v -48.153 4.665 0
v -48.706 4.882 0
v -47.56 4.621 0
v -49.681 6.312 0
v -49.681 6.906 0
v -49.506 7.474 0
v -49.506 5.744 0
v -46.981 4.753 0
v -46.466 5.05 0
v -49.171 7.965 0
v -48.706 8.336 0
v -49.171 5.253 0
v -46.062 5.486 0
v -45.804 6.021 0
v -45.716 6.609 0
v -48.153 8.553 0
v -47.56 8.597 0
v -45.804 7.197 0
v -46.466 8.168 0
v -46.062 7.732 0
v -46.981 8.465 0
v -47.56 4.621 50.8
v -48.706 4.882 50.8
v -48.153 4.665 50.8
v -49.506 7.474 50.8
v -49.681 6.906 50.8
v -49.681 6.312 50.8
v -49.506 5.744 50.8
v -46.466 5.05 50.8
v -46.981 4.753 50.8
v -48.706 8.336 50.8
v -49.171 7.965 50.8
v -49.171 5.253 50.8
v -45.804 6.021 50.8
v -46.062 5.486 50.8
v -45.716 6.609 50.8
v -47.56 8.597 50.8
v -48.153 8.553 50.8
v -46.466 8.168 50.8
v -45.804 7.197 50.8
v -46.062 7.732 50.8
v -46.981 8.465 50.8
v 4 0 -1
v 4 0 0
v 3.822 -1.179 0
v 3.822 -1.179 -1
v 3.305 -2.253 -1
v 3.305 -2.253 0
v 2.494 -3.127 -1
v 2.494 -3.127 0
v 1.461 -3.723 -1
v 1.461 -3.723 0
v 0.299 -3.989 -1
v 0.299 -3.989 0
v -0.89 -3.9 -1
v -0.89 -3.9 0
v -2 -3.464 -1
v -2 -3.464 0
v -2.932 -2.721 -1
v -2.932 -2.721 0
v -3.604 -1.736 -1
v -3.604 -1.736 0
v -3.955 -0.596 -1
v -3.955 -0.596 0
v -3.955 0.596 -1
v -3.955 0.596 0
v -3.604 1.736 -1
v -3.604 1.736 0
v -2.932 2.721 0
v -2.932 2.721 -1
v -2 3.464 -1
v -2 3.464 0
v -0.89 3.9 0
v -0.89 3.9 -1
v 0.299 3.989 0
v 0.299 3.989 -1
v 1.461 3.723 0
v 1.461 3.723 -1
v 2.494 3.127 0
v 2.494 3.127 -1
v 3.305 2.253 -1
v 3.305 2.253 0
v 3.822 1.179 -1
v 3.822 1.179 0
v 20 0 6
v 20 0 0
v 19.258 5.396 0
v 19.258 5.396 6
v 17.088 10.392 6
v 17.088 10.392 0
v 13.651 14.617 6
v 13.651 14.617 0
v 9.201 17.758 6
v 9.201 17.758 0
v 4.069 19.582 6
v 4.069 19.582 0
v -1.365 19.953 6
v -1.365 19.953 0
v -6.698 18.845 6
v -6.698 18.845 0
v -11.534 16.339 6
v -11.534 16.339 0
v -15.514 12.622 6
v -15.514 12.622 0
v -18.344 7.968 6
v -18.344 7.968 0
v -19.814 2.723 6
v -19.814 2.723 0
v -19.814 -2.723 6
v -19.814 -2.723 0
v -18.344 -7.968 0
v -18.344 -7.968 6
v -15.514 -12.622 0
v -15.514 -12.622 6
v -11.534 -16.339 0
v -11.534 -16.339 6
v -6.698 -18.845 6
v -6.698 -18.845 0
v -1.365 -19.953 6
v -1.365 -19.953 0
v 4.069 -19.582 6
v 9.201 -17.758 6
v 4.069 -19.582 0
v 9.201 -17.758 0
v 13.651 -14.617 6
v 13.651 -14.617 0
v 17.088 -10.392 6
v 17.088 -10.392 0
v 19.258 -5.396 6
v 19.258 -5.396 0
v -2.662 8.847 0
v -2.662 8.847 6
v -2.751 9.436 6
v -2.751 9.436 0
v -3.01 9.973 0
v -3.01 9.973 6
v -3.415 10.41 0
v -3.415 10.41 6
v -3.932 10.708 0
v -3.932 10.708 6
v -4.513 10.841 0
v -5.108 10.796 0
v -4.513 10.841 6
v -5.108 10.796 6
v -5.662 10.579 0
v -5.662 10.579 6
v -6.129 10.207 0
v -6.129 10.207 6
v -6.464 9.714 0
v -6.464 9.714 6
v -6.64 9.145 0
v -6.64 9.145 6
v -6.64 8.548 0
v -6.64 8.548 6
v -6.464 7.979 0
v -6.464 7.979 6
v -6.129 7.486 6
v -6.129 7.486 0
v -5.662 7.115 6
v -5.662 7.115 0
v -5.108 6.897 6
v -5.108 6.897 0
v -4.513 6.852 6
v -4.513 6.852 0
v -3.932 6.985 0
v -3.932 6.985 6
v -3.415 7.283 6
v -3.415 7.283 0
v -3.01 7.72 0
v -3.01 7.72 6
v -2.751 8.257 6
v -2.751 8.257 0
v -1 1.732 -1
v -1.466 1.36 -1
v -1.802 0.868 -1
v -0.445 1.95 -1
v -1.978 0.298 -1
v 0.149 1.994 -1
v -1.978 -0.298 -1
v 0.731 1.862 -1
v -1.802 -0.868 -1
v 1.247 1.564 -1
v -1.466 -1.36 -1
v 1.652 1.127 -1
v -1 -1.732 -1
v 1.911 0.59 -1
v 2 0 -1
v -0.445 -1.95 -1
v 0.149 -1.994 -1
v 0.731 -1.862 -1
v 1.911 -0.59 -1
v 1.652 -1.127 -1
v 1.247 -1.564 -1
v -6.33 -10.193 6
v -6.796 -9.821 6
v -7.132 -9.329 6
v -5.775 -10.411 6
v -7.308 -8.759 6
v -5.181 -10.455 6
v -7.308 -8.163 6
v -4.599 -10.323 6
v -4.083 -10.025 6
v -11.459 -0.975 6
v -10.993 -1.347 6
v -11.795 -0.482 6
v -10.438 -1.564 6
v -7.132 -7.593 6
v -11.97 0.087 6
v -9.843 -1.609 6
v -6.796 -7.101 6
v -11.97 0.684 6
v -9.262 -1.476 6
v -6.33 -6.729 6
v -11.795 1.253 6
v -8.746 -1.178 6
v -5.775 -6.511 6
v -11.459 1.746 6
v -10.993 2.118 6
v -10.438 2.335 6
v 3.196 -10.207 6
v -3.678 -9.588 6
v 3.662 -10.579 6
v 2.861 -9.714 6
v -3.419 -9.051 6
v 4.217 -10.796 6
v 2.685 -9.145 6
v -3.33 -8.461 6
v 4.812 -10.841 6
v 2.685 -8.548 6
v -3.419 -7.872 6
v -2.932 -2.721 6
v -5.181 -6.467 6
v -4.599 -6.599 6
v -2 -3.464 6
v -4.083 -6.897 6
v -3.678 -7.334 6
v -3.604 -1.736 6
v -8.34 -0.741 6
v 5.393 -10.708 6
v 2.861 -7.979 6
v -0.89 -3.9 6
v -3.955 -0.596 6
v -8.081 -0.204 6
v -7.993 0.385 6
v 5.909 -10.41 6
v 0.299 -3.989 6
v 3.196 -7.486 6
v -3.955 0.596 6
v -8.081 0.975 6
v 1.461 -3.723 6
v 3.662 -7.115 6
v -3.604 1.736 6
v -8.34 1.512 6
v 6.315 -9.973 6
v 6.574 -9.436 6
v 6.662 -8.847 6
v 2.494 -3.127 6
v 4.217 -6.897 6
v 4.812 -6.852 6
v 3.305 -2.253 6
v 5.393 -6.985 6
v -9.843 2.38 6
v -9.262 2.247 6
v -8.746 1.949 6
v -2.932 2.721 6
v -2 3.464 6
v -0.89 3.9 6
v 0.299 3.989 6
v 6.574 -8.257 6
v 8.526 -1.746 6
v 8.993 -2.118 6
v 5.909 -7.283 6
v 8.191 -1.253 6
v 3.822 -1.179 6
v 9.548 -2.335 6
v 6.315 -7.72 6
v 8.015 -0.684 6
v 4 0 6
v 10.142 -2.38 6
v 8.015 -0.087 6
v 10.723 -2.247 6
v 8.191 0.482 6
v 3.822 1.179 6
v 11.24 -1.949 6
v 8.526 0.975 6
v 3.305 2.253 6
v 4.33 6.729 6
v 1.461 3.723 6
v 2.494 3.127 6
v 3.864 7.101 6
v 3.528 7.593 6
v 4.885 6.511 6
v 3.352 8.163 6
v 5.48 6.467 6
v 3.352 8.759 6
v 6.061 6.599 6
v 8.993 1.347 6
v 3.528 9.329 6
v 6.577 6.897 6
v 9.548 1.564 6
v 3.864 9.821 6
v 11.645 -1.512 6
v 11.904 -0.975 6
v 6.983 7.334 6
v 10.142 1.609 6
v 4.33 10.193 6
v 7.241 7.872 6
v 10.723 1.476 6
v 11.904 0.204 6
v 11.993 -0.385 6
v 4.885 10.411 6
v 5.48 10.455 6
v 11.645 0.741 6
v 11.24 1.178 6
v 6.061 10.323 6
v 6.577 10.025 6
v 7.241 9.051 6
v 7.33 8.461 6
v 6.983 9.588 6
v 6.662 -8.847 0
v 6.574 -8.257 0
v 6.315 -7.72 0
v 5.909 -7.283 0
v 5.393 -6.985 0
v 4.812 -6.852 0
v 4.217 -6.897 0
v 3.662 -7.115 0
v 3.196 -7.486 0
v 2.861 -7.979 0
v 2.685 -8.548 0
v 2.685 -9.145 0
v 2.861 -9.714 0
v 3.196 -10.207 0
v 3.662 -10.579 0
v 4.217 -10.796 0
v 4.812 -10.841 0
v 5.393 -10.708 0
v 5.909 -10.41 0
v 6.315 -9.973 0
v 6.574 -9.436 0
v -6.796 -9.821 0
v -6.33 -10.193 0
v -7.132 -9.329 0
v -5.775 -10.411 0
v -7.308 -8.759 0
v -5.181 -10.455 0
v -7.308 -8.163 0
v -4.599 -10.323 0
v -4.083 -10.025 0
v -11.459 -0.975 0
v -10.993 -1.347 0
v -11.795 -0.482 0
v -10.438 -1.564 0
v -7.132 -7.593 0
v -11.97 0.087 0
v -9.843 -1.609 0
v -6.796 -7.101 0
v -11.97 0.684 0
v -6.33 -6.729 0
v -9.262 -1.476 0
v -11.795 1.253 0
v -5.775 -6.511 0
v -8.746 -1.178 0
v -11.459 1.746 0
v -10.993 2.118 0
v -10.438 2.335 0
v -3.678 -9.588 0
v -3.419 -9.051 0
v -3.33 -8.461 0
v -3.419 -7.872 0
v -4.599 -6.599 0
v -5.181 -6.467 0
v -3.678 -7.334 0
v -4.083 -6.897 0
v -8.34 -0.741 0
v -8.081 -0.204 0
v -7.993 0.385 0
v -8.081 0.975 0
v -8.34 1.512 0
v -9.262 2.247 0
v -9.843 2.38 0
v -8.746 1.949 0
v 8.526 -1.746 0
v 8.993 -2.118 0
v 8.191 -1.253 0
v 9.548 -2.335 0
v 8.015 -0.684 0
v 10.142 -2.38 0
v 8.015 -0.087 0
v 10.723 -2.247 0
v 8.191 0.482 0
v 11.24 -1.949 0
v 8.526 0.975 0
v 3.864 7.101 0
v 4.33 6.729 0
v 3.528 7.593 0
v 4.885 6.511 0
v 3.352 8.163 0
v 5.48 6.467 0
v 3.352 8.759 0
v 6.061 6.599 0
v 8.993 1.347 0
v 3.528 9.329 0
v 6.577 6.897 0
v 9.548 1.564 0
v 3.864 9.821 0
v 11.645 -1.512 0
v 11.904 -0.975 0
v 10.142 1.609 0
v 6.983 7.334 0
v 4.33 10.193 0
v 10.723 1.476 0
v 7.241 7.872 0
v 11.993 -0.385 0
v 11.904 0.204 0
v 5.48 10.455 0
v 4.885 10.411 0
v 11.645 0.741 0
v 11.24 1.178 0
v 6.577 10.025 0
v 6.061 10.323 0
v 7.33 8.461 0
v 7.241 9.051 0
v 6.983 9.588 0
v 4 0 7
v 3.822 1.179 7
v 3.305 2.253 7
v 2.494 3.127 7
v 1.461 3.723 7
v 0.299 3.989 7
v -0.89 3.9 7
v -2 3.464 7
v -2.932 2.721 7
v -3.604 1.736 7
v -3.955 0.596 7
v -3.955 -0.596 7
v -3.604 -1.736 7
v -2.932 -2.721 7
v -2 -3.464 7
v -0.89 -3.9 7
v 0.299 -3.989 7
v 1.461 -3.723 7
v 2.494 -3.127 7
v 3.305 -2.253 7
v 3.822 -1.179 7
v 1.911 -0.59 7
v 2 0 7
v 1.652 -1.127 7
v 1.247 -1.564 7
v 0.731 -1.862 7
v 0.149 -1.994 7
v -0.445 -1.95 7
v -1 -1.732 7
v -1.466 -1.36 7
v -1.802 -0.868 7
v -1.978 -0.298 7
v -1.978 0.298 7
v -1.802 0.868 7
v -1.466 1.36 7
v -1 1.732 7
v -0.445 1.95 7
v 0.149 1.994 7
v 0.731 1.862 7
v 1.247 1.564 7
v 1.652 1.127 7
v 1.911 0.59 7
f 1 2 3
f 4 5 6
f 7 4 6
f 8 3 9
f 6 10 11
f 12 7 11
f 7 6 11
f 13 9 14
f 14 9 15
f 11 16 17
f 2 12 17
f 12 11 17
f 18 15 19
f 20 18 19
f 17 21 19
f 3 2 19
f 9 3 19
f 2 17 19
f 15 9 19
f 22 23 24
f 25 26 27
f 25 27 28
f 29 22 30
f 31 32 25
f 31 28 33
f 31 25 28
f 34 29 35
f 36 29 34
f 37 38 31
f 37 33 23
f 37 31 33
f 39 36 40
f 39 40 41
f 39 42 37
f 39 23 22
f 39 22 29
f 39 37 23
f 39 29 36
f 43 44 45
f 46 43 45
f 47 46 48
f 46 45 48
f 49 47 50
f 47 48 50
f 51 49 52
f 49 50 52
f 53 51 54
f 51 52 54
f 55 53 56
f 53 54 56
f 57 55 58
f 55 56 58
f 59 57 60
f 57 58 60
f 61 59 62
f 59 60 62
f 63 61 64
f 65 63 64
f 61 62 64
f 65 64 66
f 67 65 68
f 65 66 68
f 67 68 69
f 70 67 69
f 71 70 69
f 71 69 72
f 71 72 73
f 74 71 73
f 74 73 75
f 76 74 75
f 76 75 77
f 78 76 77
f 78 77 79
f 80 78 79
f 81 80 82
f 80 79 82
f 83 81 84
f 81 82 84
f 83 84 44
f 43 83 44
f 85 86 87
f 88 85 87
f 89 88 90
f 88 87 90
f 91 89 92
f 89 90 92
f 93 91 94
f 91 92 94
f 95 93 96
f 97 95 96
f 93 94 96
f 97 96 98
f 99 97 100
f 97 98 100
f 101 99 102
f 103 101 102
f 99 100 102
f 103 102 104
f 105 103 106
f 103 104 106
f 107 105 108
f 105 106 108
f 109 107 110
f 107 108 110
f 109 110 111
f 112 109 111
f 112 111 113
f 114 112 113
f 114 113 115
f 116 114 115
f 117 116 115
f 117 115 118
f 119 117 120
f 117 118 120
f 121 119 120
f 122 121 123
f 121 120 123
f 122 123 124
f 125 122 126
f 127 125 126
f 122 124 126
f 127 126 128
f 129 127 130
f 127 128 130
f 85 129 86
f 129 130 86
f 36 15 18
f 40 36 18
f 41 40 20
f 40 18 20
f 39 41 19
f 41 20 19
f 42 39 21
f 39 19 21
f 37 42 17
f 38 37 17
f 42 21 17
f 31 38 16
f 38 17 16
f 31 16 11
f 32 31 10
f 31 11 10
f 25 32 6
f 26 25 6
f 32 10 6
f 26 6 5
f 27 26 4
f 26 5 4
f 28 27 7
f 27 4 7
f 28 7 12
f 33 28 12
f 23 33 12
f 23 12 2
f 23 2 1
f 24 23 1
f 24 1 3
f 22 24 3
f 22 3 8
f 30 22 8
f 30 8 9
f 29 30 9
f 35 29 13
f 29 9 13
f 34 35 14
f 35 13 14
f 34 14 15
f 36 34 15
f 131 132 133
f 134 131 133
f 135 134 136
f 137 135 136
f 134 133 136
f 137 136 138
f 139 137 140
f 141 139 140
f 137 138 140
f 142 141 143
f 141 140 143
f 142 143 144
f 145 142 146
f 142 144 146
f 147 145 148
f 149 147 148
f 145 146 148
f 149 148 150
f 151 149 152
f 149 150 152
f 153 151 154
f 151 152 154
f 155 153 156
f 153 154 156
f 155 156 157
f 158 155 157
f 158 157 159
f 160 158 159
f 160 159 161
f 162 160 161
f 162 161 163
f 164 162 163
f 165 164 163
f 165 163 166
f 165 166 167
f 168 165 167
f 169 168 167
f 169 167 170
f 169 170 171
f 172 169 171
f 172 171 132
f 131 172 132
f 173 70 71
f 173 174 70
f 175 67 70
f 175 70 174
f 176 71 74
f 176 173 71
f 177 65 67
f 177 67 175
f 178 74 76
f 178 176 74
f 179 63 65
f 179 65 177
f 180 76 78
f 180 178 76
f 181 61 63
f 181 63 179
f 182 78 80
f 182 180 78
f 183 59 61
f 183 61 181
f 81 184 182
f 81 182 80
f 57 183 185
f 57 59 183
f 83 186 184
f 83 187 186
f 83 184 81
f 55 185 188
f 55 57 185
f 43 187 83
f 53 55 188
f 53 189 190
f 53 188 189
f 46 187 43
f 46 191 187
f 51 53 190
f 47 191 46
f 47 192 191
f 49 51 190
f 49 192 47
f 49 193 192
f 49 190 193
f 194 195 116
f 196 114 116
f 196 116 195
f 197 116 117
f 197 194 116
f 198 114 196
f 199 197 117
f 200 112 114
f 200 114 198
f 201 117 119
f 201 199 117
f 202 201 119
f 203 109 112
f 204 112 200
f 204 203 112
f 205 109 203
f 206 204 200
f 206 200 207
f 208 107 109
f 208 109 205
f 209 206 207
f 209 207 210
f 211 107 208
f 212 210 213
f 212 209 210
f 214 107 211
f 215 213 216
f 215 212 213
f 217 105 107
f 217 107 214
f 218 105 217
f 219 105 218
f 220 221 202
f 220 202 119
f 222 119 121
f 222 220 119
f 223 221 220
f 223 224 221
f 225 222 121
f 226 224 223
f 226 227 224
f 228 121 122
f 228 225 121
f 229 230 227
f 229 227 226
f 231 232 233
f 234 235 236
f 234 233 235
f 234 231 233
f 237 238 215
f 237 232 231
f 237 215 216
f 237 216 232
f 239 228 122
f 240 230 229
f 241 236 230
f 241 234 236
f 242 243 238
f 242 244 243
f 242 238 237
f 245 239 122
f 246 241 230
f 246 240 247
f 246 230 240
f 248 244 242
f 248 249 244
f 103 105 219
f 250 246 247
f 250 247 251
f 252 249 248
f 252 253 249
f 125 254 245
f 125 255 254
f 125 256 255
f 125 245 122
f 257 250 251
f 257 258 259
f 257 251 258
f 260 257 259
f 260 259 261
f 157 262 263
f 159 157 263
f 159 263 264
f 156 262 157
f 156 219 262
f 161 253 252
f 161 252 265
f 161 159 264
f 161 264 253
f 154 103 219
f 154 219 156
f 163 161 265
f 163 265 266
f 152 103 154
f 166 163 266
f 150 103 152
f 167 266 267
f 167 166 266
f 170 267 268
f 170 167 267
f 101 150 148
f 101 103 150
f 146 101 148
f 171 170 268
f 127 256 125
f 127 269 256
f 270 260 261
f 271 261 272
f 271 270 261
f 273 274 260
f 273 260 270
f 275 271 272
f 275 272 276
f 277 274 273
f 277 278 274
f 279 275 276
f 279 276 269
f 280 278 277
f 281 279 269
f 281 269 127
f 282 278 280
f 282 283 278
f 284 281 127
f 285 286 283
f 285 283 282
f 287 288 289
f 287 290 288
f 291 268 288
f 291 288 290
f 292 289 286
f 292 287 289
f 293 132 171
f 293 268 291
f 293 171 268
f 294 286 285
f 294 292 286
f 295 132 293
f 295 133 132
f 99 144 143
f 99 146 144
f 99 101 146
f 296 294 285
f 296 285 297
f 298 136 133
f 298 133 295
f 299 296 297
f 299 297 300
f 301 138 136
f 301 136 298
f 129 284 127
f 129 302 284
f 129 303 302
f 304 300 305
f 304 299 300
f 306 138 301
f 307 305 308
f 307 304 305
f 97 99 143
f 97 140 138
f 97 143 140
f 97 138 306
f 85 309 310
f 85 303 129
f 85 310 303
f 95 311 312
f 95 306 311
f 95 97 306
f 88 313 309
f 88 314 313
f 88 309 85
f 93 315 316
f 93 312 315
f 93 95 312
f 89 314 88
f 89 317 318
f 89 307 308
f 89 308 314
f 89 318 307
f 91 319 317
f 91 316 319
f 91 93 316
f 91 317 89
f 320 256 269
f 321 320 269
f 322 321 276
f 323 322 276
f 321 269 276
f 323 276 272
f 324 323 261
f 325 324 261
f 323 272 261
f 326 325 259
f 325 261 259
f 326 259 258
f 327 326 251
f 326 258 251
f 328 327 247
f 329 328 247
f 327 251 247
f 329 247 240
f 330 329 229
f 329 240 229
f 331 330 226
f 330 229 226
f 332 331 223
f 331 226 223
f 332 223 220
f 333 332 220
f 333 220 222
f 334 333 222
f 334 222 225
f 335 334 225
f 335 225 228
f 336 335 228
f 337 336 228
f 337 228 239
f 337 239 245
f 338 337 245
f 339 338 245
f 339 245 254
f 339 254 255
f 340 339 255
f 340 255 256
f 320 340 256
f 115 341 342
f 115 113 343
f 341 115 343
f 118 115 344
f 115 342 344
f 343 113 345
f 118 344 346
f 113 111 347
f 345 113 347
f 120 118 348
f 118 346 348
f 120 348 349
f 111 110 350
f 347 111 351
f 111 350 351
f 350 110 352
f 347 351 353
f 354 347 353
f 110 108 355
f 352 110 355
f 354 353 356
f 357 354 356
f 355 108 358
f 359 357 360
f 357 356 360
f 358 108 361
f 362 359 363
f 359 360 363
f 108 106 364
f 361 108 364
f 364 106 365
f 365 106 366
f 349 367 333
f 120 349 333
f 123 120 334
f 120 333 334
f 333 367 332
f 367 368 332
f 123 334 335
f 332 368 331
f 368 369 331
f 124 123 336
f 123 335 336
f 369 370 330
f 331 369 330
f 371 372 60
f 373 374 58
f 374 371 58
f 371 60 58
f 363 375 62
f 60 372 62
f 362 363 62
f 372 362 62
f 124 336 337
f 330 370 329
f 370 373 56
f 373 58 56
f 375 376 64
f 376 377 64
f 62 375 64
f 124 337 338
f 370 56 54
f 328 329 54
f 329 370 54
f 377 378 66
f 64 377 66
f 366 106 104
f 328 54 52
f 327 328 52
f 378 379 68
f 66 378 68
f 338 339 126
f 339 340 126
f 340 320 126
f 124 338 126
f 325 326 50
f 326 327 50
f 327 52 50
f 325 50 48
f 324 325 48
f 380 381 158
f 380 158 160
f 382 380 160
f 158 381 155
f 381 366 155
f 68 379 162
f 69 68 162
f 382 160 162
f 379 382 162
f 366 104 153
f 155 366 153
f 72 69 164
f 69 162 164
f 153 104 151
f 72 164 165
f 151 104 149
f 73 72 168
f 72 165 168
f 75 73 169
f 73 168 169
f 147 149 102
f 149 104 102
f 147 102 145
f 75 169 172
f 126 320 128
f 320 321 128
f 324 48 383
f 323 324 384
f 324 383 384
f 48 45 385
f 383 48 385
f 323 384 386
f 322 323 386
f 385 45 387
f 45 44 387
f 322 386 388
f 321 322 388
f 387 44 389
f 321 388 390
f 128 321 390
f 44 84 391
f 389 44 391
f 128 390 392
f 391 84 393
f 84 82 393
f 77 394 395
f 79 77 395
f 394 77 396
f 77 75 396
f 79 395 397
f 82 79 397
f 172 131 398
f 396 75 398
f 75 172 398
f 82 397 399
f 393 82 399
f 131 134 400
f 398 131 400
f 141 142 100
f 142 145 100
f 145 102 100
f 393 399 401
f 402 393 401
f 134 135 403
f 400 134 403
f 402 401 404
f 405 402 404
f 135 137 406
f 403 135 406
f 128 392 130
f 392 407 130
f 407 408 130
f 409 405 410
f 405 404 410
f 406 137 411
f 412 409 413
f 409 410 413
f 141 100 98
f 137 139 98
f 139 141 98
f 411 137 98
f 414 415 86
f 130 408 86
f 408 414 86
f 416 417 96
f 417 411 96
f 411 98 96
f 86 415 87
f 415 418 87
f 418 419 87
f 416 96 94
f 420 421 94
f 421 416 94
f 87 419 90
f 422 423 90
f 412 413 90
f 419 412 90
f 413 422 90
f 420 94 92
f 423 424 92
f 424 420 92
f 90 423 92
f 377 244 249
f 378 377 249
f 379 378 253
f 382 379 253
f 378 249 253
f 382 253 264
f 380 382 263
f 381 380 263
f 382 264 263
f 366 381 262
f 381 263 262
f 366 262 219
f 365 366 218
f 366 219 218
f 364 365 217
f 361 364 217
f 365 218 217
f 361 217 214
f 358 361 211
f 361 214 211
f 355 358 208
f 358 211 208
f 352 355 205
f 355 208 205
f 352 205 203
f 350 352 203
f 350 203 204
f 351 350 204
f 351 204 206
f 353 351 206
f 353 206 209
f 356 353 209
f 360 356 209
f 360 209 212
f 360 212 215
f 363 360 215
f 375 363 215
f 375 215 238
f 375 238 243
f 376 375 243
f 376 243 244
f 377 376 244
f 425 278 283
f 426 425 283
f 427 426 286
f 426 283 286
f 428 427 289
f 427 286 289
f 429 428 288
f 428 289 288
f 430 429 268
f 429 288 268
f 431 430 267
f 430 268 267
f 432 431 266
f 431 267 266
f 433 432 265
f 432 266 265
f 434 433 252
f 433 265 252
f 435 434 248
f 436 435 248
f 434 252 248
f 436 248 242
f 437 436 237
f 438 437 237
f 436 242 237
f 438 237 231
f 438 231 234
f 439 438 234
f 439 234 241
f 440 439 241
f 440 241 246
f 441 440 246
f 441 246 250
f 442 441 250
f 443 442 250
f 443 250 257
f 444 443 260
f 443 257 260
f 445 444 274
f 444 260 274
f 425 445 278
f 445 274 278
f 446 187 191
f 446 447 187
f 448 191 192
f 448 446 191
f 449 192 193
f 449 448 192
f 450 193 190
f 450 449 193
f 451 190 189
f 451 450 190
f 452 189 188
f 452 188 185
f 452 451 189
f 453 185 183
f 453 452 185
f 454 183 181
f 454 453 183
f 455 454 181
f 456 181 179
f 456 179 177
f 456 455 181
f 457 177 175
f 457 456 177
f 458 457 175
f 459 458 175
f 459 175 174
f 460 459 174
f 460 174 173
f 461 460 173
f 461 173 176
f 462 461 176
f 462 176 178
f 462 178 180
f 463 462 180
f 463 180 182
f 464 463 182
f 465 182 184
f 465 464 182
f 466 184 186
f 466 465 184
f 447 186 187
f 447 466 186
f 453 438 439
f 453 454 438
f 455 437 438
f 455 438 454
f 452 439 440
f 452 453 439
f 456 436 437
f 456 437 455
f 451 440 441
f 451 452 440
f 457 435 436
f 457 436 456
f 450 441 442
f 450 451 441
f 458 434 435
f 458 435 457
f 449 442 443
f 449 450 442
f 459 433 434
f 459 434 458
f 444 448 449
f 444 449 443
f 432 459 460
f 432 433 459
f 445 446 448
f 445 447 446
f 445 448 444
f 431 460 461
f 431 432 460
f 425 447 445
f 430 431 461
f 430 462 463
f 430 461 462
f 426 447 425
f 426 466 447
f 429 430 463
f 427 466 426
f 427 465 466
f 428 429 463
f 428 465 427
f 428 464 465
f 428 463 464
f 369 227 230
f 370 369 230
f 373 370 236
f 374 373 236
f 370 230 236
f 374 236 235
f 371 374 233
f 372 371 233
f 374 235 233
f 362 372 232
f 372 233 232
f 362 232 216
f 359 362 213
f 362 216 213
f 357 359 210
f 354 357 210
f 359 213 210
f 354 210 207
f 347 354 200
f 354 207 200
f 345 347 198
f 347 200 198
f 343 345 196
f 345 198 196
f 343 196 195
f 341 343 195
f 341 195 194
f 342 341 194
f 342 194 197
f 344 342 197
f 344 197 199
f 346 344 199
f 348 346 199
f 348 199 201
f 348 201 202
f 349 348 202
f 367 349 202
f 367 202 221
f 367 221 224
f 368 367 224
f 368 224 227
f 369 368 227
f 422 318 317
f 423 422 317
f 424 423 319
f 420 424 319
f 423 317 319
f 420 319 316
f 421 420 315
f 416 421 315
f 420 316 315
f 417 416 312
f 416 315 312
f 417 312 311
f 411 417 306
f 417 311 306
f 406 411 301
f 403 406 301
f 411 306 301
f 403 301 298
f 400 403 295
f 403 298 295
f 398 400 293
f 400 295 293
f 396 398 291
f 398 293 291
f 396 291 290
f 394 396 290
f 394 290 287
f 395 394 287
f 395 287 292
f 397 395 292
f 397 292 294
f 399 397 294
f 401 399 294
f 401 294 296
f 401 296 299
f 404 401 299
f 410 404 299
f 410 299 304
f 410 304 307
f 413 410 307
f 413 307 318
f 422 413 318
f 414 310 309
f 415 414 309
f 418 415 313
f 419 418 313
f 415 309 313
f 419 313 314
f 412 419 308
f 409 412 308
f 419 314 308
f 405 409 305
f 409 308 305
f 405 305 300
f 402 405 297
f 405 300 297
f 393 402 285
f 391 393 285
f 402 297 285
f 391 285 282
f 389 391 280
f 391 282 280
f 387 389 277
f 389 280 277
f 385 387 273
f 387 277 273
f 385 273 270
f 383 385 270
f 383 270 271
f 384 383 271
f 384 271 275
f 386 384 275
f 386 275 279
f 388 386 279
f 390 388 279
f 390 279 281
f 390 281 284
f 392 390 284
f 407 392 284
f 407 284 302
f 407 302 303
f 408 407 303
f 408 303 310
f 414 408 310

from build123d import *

# Parameters (mm, degrees)
F0_R     = 20
F1_DEPTH = 6
F2_R     = 2
F3_DEPTH = 6.001
F2_R_2   = 4
F4_DEPTH = 1
F5_R     = 4
F5_R_2   = 2
F6_DEPTH = 1
F7_R     = 1.9939
F8_DEPTH = 50.8


with BuildPart() as f1:
    # F0 (on Top) → F1 (new body)
    with BuildSketch(Plane.XY):
        Circle(F0_R)
    extrude(amount=F1_DEPTH)

    # F2 (on face) → F3 (cut, through all)
    with BuildSketch(Plane.XY.offset(6)):
        with Locations((-4.6624582915, 8.8465520221)):
            Circle(F2_R)
        with Locations((5.3301096413, 8.4610833356)):
            Circle(F2_R)
        with Locations((9.9925679328, -0.3854686866)):
            Circle(F2_R)
        with Locations((4.6624582915, -8.8465520221)):
            Circle(F2_R)
        with Locations((-5.3301096413, -8.4610833356)):
            Circle(F2_R)
        with Locations((-9.9925679328, 0.3854686866)):
            Circle(F2_R)
        Circle(F2_R)
    extrude(amount=-F3_DEPTH, mode=Mode.SUBTRACT)

    # F2 (on face) → F4 (join)
    with BuildSketch(Plane.XY.offset(6)):
        Circle(F2_R_2)
        Circle(F2_R, mode=Mode.SUBTRACT)
    extrude(amount=F4_DEPTH)

    # F5 (on face) → F6 (join)
    with BuildSketch(Plane(origin=(0, 0, 0), x_dir=(1, 0, 0), z_dir=(0, 0, -1))):
        Circle(F5_R)
        Circle(F5_R_2, mode=Mode.SUBTRACT)
    extrude(amount=F6_DEPTH)


with BuildPart() as f8:
    # F7 (on Top) → F8 (new body)
    with BuildSketch(Plane.XY):
        with Locations((-47.7094948292, 6.6089383326)):
            Circle(F7_R)
    extrude(amount=F8_DEPTH)


solid = Compound([f1.part, f8.part])
